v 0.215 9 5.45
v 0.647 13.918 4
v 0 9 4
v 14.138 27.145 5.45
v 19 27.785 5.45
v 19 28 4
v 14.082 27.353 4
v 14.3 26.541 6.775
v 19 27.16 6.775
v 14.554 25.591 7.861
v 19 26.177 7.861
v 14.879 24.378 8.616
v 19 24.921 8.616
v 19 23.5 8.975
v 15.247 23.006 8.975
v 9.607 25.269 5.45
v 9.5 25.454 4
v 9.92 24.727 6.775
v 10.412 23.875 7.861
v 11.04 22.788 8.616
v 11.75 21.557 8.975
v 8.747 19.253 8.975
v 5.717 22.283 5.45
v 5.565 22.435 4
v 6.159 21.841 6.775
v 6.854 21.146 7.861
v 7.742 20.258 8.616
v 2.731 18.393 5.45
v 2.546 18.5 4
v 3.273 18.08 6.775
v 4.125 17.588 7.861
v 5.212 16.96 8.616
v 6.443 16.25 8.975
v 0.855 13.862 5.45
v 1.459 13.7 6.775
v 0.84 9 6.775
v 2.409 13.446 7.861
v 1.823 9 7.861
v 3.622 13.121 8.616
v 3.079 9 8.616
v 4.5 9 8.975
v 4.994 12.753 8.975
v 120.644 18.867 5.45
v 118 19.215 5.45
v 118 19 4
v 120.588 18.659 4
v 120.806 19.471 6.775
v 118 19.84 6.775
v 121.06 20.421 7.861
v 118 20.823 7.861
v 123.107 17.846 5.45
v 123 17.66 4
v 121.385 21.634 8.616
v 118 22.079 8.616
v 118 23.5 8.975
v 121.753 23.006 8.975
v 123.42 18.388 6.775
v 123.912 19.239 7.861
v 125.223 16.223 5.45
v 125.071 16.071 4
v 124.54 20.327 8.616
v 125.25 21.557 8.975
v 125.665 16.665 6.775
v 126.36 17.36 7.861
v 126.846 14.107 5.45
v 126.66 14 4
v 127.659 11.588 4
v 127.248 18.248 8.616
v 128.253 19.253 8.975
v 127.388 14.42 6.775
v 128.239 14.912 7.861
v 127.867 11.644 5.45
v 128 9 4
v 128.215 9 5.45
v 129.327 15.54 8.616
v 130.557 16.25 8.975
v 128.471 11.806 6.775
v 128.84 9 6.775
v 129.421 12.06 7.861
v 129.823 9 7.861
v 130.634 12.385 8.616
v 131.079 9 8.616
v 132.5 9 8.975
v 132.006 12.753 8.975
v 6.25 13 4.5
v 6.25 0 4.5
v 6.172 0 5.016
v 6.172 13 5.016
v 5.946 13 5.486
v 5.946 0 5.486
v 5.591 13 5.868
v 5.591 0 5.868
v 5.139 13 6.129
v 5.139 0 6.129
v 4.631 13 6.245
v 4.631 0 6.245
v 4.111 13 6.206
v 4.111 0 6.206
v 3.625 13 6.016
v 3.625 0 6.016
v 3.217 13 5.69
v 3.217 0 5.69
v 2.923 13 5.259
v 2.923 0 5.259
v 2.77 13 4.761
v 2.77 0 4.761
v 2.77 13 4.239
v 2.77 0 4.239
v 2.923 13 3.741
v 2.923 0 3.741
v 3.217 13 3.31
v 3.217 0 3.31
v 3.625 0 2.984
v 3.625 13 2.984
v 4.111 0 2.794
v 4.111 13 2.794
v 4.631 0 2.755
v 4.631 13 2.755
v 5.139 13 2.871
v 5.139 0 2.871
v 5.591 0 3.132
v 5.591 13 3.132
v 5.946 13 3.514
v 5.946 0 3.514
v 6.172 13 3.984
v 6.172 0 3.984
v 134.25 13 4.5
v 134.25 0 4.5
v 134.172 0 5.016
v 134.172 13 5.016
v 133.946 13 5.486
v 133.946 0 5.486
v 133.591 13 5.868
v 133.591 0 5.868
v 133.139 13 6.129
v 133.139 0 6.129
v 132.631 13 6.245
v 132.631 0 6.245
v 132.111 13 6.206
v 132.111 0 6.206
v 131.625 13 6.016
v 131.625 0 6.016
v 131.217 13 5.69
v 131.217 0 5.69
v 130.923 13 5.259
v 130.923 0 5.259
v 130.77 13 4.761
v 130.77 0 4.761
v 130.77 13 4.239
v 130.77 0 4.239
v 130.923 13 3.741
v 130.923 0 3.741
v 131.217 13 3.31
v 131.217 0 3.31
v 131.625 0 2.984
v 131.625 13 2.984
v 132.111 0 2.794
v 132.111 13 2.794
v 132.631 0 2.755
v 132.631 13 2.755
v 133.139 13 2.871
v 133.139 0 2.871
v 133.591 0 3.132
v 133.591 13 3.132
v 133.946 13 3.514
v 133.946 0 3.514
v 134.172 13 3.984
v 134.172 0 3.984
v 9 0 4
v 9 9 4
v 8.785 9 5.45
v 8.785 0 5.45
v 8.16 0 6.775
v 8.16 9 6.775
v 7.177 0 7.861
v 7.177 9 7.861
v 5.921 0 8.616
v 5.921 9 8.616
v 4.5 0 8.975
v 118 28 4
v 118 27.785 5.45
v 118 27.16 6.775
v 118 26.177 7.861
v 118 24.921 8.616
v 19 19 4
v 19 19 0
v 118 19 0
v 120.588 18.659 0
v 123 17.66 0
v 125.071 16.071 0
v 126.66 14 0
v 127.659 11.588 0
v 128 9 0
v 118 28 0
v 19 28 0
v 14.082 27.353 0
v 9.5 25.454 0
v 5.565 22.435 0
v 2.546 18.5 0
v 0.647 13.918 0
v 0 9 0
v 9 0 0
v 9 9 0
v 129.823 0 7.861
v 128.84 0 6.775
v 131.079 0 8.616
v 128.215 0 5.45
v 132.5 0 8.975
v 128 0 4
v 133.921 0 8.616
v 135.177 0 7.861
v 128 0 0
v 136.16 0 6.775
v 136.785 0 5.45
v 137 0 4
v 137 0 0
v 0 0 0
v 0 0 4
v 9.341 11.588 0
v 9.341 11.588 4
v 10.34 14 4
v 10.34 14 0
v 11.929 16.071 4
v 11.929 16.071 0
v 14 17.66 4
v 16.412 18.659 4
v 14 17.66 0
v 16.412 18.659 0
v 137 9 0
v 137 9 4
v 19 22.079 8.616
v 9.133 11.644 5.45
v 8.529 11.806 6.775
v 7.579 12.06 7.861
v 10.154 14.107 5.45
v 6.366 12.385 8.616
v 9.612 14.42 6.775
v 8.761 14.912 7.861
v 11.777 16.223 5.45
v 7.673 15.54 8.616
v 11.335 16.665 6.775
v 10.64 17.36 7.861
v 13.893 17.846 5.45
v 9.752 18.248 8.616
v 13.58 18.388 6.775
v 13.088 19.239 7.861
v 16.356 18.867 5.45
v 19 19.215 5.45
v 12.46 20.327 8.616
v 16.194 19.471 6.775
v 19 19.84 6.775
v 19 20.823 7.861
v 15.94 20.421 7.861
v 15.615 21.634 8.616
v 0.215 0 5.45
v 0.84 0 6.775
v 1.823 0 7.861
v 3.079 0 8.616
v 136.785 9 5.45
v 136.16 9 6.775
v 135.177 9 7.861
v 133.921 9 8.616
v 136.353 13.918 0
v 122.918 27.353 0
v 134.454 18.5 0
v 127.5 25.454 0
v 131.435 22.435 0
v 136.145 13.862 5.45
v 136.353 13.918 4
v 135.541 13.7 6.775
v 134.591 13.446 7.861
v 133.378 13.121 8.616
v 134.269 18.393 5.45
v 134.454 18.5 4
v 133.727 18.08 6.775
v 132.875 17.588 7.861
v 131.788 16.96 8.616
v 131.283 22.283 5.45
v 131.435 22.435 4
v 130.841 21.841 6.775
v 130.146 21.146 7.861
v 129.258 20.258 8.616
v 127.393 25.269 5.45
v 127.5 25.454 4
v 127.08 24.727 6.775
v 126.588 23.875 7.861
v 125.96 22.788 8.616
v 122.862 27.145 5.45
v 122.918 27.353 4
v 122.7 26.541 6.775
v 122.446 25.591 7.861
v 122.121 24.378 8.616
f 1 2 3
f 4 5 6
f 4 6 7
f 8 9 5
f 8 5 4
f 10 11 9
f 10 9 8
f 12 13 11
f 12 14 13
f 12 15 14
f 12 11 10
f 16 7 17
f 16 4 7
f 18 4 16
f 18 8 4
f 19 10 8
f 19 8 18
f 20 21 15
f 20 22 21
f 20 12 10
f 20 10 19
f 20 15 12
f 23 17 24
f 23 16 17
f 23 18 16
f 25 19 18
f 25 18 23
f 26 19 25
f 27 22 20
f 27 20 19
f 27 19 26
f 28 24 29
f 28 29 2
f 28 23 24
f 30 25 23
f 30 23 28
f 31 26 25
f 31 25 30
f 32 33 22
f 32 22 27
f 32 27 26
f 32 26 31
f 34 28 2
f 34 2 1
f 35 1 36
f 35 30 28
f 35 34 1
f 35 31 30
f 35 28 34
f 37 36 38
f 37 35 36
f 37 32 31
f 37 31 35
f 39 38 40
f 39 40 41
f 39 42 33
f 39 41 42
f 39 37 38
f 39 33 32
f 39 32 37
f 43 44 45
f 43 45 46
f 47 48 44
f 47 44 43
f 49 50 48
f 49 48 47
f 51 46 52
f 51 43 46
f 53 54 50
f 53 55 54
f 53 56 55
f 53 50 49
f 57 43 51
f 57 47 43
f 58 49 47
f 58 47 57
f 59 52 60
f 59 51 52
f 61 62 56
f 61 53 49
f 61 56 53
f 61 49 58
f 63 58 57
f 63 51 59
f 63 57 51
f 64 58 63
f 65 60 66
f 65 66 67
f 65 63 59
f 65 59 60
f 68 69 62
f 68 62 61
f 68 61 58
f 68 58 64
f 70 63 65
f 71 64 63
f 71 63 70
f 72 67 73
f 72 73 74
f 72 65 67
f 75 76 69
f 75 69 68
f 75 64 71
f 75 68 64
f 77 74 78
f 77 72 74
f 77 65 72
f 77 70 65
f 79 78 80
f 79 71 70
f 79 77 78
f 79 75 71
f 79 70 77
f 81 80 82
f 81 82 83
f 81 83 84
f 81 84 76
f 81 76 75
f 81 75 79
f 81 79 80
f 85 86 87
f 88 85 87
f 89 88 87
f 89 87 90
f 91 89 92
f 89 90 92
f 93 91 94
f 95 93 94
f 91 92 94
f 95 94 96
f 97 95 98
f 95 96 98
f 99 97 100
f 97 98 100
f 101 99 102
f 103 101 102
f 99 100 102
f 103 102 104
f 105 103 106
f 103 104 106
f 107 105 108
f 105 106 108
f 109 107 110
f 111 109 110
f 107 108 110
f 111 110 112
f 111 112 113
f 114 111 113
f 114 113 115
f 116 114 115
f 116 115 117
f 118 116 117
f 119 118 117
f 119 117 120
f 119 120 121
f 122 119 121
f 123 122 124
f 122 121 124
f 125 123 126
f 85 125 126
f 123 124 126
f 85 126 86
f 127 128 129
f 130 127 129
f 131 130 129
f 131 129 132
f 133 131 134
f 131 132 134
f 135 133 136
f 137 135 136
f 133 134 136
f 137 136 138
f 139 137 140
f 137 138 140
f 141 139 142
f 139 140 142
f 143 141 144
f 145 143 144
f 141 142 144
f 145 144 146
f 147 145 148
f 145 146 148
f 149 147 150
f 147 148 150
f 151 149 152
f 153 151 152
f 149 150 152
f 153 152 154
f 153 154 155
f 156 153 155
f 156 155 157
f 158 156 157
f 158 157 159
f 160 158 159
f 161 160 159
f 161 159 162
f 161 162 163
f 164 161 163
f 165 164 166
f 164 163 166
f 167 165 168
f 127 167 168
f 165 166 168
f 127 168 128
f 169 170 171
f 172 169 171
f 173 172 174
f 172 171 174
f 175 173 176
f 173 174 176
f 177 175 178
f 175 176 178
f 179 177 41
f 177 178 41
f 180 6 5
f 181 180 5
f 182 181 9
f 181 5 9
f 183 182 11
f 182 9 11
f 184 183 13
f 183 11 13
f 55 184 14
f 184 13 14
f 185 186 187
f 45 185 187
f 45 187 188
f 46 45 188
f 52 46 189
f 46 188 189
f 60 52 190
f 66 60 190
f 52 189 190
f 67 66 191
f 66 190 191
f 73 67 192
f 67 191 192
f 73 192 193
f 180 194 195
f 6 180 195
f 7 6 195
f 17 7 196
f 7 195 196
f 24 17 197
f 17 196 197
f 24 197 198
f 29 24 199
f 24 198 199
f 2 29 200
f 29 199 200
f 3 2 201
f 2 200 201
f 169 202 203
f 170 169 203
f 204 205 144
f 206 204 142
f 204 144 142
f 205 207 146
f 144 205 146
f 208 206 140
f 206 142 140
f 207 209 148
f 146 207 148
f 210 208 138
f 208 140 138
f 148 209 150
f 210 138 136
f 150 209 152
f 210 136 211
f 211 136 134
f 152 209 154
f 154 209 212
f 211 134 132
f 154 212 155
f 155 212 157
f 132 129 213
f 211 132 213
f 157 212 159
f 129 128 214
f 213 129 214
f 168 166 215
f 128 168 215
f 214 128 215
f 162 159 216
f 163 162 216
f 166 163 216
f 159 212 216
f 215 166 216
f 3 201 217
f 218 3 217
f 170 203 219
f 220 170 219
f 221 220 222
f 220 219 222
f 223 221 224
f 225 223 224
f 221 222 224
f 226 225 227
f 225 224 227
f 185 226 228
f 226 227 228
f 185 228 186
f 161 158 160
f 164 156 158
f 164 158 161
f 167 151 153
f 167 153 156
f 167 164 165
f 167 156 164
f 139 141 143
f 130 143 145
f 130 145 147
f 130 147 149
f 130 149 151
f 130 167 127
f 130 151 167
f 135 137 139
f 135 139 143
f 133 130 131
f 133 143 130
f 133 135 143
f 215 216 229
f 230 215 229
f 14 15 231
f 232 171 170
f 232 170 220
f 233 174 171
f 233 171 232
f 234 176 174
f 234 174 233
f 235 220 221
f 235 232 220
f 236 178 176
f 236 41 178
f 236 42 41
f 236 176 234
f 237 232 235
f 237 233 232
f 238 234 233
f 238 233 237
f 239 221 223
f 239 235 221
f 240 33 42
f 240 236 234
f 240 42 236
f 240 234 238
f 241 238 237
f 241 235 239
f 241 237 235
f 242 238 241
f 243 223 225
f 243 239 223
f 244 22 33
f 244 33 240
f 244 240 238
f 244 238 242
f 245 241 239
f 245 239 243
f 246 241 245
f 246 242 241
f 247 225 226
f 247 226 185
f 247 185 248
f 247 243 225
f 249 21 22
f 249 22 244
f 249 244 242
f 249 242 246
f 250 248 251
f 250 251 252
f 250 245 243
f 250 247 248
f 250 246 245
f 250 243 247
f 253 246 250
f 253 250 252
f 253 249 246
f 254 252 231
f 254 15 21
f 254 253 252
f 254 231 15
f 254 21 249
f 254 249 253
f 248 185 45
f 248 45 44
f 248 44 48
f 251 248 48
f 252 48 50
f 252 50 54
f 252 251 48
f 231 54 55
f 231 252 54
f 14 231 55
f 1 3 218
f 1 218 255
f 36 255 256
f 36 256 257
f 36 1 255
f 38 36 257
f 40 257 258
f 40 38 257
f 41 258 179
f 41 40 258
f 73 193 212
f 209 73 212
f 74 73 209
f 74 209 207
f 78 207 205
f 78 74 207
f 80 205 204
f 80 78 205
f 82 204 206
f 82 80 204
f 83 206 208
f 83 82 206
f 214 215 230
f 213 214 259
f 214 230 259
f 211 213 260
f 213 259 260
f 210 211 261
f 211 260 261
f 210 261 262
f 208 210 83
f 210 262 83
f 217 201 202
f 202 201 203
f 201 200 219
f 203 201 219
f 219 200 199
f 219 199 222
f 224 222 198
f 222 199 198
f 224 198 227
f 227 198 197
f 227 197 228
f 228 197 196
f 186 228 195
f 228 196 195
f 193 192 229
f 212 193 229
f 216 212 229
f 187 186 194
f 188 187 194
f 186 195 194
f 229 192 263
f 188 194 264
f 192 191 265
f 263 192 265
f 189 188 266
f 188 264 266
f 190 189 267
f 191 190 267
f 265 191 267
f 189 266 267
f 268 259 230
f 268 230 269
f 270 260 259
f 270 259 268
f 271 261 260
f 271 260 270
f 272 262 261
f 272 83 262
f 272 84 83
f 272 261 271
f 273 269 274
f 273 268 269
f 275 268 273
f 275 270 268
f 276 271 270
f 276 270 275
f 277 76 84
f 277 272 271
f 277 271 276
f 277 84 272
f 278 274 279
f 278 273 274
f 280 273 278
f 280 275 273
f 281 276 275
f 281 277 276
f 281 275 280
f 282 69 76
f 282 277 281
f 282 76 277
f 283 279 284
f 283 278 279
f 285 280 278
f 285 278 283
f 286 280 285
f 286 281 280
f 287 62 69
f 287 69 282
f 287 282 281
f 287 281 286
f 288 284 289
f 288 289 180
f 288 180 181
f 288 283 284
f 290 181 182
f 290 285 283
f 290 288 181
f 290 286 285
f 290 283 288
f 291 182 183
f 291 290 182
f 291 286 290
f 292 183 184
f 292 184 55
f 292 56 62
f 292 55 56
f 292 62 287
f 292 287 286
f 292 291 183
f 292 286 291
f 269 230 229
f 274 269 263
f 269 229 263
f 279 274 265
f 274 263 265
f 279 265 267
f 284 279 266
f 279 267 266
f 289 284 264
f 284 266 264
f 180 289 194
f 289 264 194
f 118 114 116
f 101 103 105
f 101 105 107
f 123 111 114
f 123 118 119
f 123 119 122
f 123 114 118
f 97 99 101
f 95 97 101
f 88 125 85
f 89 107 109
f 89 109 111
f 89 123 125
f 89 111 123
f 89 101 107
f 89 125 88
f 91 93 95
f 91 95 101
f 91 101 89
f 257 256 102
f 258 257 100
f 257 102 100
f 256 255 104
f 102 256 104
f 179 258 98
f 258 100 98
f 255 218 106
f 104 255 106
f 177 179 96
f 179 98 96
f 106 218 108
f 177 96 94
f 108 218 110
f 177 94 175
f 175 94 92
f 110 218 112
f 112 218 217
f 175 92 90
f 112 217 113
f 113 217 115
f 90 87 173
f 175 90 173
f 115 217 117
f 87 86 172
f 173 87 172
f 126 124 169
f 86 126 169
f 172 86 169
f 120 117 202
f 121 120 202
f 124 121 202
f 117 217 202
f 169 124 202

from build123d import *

# Parameters (mm, degrees)
F1_DEPTH     = 9
F2_T1_DEPTH  = 21.5
F2_T3_DEPTH  = 99
F2_T6_ANGLE  = 90
F2_T8_ANGLE  = 90
F2_T10_ANGLE = 90
F2_T12_ANGLE = 90
F3_R         = 1.75
F4_DEPTH     = 13


# Not quite as in the source:
# - a fillet or chamfer that OpenCascade refuses, or shapes differently, is made with other operations: its cross-section is extruded or revolved along the edge and cut away or added


with BuildPart() as f1:
    # F0 (on Top) → F1 (new body)
    with BuildSketch(Plane.XY):
        with BuildLine():
            Line((0, 9), (0, 0))
            Line((0, 0), (9, 0))
            Line((9, 0), (9, 9))
            ThreePointArc((9, 9), (11.9289321881, 16.0710678119), (19, 19))
            Line((19, 19), (118, 19))
            ThreePointArc((118, 19), (125.0710678119, 16.0710678119), (128, 9))
            Line((128, 9), (128, 0))
            Line((128, 0), (137, 0))
            Line((137, 0), (137, 9))
            ThreePointArc((137, 9), (131.4350288425, 22.4350288425), (118, 28))
            Line((118, 28), (19, 28))
            ThreePointArc((19, 28), (5.5649711575, 22.4350288425), (0, 9))
        make_face()
    extrude(amount=F1_DEPTH)

    # F2: fillet of radius 5 on 7 edges, made by hand

    # F2_s2 → F2_t1 (cut)
    with BuildSketch(Plane.XZ.offset(-9)):
        with BuildLine():
            ThreePointArc((0, 4), (1.4644660941, 7.5355339059), (5, 9))
            Line((5, 9), (0, 9))
            Line((0, 9), (0, 4))
        make_face()
        with BuildLine():
            ThreePointArc((137, 4), (135.5355339059, 7.5355339059), (132, 9))
            Line((132, 9), (137, 9))
            Line((137, 9), (137, 4))
        make_face()
        with BuildLine():
            ThreePointArc((128, 4), (129.4644660941, 7.5355339059), (133, 9))
            Line((133, 9), (128, 9))
            Line((128, 9), (128, 4))
        make_face()
        with BuildLine():
            ThreePointArc((9, 4), (7.5355339059, 7.5355339059), (4, 9))
            Line((4, 9), (9, 9))
            Line((9, 9), (9, 4))
        make_face()
    extrude(amount=F2_T1_DEPTH, mode=Mode.SUBTRACT)

    # F2_s4 → F2_t3 (cut)
    with BuildSketch(Plane.YZ.offset(19)):
        with BuildLine():
            ThreePointArc((28, 4), (26.5355339059, 7.5355339059), (23, 9))
            Line((23, 9), (28, 9))
            Line((28, 9), (28, 4))
        make_face()
        with BuildLine():
            ThreePointArc((19, 4), (20.4644660941, 7.5355339059), (24, 9))
            Line((24, 9), (19, 9))
            Line((19, 9), (19, 4))
        make_face()
    extrude(amount=F2_T3_DEPTH, mode=Mode.SUBTRACT)

    # F2_s5 → F2_t6 (revolve, cut)
    with BuildSketch(Plane.YZ.offset(19)):
        with BuildLine():
            ThreePointArc((28, 4), (26.5355339059, 7.5355339059), (23, 9))
            Line((23, 9), (28, 9))
            Line((28, 9), (28, 4))
        make_face()
    revolve(axis=Axis((19, 9, 9), (0, 0, 1)), revolution_arc=F2_T6_ANGLE, mode=Mode.SUBTRACT)

    # F2_s7 → F2_t8 (revolve, cut)
    with BuildSketch(Plane.XZ.offset(-9)):
        with BuildLine():
            ThreePointArc((137, 4), (135.5355339059, 7.5355339059), (132, 9))
            Line((132, 9), (137, 9))
            Line((137, 9), (137, 4))
        make_face()
    revolve(axis=Axis((118, 9, 9), (0, 0, 1)), revolution_arc=F2_T8_ANGLE, mode=Mode.SUBTRACT)

    # F2_s9 → F2_t10 (revolve, cut)
    with BuildSketch(Plane.YZ.offset(118)):
        with BuildLine():
            ThreePointArc((19, 4), (20.4644660941, 7.5355339059), (24, 9))
            Line((24, 9), (19, 9))
            Line((19, 9), (19, 4))
        make_face()
    revolve(axis=Axis((118, 9, 9), (0, 0, -1)), revolution_arc=F2_T10_ANGLE, mode=Mode.SUBTRACT)

    # F2_s11 → F2_t12 (revolve, cut)
    with BuildSketch(Plane.XZ.offset(-9)):
        with BuildLine():
            ThreePointArc((9, 4), (7.5355339059, 7.5355339059), (4, 9))
            Line((4, 9), (9, 9))
            Line((9, 9), (9, 4))
        make_face()
    revolve(axis=Axis((19, 9, 9), (0, 0, -1)), revolution_arc=F2_T12_ANGLE, mode=Mode.SUBTRACT)

    # F3 (on face) → F4 (cut)
    with BuildSketch(Plane.XZ):
        with Locations((4.5, 4.5)):
            Circle(F3_R)
        with Locations((132.5, 4.5)):
            Circle(F3_R)
    extrude(amount=-F4_DEPTH, mode=Mode.SUBTRACT)


solid = f1.part
